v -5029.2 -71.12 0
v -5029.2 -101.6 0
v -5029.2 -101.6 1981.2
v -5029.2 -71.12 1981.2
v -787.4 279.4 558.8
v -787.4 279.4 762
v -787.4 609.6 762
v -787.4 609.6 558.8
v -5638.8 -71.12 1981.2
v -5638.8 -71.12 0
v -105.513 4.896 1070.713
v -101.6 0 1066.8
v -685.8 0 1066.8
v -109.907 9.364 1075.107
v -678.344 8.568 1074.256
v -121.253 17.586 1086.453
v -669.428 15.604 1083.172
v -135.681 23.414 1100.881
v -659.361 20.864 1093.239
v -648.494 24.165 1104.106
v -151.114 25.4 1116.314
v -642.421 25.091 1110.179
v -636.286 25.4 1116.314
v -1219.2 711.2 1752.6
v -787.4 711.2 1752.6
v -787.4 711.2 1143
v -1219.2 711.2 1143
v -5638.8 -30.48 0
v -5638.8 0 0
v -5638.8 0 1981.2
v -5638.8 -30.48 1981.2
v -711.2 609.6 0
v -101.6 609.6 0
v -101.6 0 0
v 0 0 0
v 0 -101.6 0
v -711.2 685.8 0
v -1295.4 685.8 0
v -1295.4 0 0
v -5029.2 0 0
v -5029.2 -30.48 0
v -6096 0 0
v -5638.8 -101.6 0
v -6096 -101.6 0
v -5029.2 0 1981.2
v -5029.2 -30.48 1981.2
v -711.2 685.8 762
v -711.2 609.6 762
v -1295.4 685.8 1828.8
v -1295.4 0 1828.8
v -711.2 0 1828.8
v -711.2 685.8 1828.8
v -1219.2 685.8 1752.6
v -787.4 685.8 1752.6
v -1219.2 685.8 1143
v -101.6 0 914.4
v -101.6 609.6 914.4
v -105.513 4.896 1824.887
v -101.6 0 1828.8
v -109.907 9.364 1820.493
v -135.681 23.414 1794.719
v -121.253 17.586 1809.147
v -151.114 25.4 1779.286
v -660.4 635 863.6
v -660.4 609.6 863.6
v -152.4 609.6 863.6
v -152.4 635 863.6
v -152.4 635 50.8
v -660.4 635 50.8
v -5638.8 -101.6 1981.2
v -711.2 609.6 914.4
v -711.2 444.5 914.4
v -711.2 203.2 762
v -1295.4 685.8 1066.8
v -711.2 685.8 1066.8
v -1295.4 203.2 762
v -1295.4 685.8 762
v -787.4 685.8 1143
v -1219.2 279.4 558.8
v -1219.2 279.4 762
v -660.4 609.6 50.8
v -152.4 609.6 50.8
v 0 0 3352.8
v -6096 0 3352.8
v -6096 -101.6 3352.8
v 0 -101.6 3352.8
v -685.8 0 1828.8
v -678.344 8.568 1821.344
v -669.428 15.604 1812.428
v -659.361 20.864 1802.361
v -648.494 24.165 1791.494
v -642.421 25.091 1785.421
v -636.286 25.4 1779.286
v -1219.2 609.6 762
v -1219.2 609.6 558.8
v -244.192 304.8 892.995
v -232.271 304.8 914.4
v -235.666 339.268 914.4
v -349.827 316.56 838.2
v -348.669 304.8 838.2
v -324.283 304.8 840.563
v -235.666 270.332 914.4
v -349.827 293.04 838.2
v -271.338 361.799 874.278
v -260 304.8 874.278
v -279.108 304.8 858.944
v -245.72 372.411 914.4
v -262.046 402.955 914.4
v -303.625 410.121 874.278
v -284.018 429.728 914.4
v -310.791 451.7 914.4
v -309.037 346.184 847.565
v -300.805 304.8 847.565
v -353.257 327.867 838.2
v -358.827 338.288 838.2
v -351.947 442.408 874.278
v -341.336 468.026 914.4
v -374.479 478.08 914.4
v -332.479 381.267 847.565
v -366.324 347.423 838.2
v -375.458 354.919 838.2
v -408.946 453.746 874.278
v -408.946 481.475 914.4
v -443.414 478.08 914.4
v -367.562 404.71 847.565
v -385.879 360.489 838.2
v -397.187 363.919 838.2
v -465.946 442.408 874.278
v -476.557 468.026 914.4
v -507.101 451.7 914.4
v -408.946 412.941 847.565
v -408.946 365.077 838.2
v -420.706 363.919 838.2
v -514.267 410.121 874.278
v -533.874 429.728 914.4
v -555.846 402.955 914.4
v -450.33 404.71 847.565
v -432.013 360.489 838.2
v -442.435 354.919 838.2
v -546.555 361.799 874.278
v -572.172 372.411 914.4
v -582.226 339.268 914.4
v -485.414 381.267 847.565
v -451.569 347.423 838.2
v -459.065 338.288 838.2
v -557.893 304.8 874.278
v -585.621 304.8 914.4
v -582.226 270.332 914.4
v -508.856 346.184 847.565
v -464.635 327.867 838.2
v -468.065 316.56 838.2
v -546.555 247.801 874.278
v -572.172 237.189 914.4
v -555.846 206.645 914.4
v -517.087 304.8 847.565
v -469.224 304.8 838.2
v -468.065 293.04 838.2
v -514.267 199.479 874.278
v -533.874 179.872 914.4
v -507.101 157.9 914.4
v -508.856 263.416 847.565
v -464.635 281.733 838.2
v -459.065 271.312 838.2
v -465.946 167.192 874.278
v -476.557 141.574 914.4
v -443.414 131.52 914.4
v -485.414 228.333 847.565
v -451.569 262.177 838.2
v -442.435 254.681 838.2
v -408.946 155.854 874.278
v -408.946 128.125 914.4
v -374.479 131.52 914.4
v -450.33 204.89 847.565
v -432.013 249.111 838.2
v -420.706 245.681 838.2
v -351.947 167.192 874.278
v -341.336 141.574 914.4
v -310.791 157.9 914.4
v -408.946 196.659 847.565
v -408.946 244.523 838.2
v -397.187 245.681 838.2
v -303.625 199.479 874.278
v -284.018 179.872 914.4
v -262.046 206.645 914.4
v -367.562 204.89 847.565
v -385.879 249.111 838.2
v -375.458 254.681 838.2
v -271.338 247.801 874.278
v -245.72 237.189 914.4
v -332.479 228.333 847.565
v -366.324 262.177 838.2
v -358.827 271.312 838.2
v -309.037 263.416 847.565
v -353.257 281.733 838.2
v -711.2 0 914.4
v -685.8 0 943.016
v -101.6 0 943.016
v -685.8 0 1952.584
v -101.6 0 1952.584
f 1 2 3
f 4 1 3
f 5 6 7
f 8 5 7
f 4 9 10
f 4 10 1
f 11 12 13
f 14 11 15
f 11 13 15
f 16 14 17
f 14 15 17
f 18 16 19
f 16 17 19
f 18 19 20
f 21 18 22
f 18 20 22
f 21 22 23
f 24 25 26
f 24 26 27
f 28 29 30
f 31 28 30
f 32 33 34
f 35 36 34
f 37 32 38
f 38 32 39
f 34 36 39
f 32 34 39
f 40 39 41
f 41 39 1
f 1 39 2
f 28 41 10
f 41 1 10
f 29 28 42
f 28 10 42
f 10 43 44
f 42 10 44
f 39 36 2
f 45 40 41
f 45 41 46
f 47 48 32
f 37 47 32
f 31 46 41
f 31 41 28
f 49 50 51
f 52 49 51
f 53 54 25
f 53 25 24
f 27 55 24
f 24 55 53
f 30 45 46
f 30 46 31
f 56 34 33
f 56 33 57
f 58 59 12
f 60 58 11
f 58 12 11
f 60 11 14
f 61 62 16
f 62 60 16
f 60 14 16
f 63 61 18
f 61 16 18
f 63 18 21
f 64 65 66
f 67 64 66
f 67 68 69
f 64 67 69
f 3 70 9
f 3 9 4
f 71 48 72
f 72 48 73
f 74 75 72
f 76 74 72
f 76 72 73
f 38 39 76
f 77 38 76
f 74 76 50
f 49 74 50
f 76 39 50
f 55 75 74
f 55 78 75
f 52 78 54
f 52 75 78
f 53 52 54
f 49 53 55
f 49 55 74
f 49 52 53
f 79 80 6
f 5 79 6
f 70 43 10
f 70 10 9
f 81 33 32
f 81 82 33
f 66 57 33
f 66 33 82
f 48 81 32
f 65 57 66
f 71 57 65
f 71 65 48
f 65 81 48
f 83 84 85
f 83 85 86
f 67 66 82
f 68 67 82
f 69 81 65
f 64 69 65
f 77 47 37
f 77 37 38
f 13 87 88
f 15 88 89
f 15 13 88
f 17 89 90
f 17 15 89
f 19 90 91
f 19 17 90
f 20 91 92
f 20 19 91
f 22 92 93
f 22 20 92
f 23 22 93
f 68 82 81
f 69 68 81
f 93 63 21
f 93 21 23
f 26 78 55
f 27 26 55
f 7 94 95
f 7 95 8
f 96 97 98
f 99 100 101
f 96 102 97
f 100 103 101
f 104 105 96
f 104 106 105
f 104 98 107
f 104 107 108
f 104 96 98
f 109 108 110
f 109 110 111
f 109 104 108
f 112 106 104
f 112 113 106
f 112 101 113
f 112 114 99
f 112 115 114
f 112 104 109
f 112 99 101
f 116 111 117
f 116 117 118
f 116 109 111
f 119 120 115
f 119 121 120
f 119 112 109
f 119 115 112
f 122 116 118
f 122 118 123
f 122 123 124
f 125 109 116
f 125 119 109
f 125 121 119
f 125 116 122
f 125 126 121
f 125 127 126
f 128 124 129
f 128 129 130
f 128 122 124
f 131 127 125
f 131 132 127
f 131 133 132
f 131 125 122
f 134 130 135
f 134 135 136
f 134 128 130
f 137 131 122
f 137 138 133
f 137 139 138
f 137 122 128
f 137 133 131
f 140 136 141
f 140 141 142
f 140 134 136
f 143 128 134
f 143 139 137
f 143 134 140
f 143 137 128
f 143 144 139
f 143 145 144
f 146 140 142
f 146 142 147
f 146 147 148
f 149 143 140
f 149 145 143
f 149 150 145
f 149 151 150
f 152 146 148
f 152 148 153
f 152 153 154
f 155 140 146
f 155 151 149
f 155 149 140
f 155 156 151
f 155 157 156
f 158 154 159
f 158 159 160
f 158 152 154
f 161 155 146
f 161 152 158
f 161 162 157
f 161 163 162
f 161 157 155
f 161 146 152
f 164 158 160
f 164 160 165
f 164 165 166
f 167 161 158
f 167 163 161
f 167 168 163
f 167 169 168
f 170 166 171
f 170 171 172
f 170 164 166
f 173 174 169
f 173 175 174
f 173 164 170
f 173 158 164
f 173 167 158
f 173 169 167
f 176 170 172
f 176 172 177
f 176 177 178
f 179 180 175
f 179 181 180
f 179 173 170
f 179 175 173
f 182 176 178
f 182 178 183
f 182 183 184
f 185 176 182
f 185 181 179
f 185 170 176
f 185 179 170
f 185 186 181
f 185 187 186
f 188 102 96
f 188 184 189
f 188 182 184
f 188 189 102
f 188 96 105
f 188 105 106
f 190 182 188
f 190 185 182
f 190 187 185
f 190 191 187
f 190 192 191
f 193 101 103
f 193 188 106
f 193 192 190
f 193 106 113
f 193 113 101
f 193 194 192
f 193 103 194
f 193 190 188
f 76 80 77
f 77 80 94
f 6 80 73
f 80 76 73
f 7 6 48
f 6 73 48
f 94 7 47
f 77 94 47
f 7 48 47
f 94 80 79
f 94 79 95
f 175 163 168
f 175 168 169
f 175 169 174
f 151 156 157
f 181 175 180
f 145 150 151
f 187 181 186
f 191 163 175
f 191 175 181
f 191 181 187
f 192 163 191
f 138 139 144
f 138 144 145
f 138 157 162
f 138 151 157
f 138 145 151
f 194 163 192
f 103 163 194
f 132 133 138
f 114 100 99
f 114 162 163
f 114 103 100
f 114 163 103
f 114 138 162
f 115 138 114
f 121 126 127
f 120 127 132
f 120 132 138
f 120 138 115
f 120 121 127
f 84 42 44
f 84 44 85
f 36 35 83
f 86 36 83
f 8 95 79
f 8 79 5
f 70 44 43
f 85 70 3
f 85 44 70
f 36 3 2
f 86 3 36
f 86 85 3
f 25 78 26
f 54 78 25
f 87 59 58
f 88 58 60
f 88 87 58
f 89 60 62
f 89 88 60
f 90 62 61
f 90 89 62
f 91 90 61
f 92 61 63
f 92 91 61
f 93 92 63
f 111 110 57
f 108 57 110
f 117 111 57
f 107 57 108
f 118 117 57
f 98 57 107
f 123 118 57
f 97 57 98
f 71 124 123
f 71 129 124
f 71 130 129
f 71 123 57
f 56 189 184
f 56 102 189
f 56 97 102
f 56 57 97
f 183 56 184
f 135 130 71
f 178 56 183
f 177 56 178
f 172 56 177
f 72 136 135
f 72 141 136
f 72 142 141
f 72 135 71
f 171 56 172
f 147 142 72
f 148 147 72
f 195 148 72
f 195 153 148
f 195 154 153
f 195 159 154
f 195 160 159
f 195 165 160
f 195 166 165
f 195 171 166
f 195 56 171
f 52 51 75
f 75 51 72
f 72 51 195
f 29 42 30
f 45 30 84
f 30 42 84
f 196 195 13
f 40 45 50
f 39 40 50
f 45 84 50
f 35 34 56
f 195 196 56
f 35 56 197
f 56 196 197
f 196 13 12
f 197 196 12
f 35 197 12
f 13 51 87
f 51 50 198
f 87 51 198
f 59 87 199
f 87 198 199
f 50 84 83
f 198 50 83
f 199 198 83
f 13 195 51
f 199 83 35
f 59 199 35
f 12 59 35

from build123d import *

# Parameters (mm, degrees)
F0_W         = 6096
F0_H         = 3352.8
F1_DEPTH     = 101.6
F2_W         = 609.6
F2_H         = 1981.2
F3_DEPTH     = 30.48
F4_W         = 609.6
F4_H         = 1981.2
F5_DEPTH     = 30.48
F7_DEPTH     = 685.8
F9_DEPTH     = 609.6
F6_W         = 609.6
F6_H         = 914.4
F10_DEPTH    = 609.6
F11_R        = 176.6748318238
F12_DEPTH    = 76.2
F14_W        = 431.8
F14_H        = 609.6
F15_DEPTH    = 25.4
F16_W        = 431.8
F16_H        = 330.2
F17_DEPTH    = 203.2
F19_DEPTH    = 25.4
F6_W_2       = 584.2
F6_H_2       = 762
F20_DEPTH    = 25.4
F21_T1_DEPTH = 1009.5685763581
F21_T3_DEPTH = 707.9842881791


# Not quite as in the source:
# - a fillet or chamfer that OpenCascade refuses, or shapes differently, is made with other operations: its cross-section is extruded or revolved along the edge and cut away or added


with BuildPart() as f1:
    # F0 (on Front) → F1 (new body)
    with BuildSketch(Plane.XZ):
        with Locations((-3048, 1676.4)):
            Rectangle(F0_W, F0_H)
    extrude(amount=F1_DEPTH)

    # F2 (on face) → F3 (cut)
    with BuildSketch(Plane.XZ.offset(101.6)):
        with Locations((-5334, 990.6)):
            Rectangle(F2_W, F2_H)
    extrude(amount=-F3_DEPTH, mode=Mode.SUBTRACT)

    # F4 (on face) → F5 (cut)
    with BuildSketch(Plane(origin=(0, 0, 0), x_dir=(-1, 0, 0), z_dir=(0, 1, 0))):
        with Locations((5334, 990.6)):
            Rectangle(F4_W, F4_H)
    extrude(amount=-F5_DEPTH, mode=Mode.SUBTRACT)

    # F6 (on face) → F7 (join)
    with BuildSketch(Plane(origin=(0, 0, 0), x_dir=(-1, 0, 0), z_dir=(0, 1, 0))):
        Polygon((711.2, 914.4), (711.2, 0), (1295.4, 0), (1295.4, 1828.8), (711.2, 1828.8), align=None)
    extrude(amount=F7_DEPTH)

    # F8 (on face) → F9 (cut)
    with BuildSketch(Plane.YZ.offset(-711.2)):
        Polygon((203.2, 762), (685.8, 762), (685.8, 1066.8), align=None)
    extrude(amount=-F9_DEPTH, mode=Mode.SUBTRACT)

    # F6 (on face) → F10 (join)
    with BuildSketch(Plane(origin=(0, 0, 0), x_dir=(-1, 0, 0), z_dir=(0, 1, 0))):
        with Locations((406.4, 457.2)):
            Rectangle(F6_W, F6_H)
    extrude(amount=F10_DEPTH)

    # F11 (on face) → F12 (cut)
    with BuildSketch(Plane.XY.offset(914.4)):
        with Locations((-408.9462161064, 304.8)):
            Circle(F11_R)
    extrude(amount=-F12_DEPTH, mode=Mode.SUBTRACT)

    # F13: fillet of radius 127 on 1 edges, made by hand

    # F13_s1 → F13_t2 (revolve)
    with BuildSketch(Plane.XZ.offset(-304.8)):
        with BuildLine():
            ThreePointArc((-232.2713842826, 914.4), (-279.1080421313, 858.9441766302), (-348.6688069344, 838.2))
            Line((-348.6688069344, 838.2), (-232.2713842826, 838.2))
            Line((-232.2713842826, 838.2), (-232.2713842826, 914.4))
        make_face()
    revolve(axis=Axis((-408.9462161064, 304.8, 838.2), (0, 0, 1)))

    # F14 (on face) → F15 (join)
    with BuildSketch(Plane(origin=(0, 685.8, 0), x_dir=(-1, 0, 0), z_dir=(0, 1, 0))):
        with Locations((1003.3, 1447.8)):
            Rectangle(F14_W, F14_H)
    extrude(amount=F15_DEPTH)

    # F16 (on face) → F17 (cut)
    with BuildSketch(Plane.XY.offset(762)):
        with Locations((-1003.3, 444.5)):
            Rectangle(F16_W, F16_H)
    extrude(amount=-F17_DEPTH, mode=Mode.SUBTRACT)

    # F18 (on face) → F19 (join)
    with BuildSketch(Plane(origin=(0, 609.6, 0), x_dir=(-1, 0, 0), z_dir=(0, 1, 0))):
        Polygon((152.4, 50.8), (660.4, 50.8), (660.4, 762), (660.4, 863.6), (152.4, 863.6), align=None)
    extrude(amount=F19_DEPTH)

    # F6 (on face) → F20 (join)
    with BuildSketch(Plane(origin=(0, 0, 0), x_dir=(-1, 0, 0), z_dir=(0, 1, 0))):
        with Locations((393.7, 1447.8)):
            Rectangle(F6_W_2, F6_H_2)
    extrude(amount=F20_DEPTH)

    # F21: fillet of radius 60.96 on 4 edges, made by hand

    # F21_s2 → F21_t1 (cut)
    with BuildSketch(Plane.XY.offset(943.0157118209)):
        with BuildLine():
            ThreePointArc((-101.6, 0), (-123.2894093504, 18.6795575203), (-151.1137152716, 25.4))
            Line((-151.1137152716, 25.4), (-101.6, 25.4))
            Line((-101.6, 25.4), (-101.6, 0))
        make_face()
        with BuildLine():
            ThreePointArc((-685.8, 0), (-664.1105906496, 18.6795575203), (-636.2862847284, 25.4))
            Line((-636.2862847284, 25.4), (-685.8, 25.4))
            Line((-685.8, 25.4), (-685.8, 0))
        make_face()
    extrude(amount=F21_T1_DEPTH, mode=Mode.SUBTRACT)

    # F21_s4 → F21_t3 (cut)
    with BuildSketch(Plane.YZ.offset(-685.8)):
        with BuildLine():
            ThreePointArc((0, 1066.8), (18.6795575203, 1088.4894093504), (25.4, 1116.3137152716))
            Line((25.4, 1116.3137152716), (25.4, 1066.8))
            Line((25.4, 1066.8), (0, 1066.8))
        make_face()
        with BuildLine():
            ThreePointArc((0, 1828.8), (18.6795575203, 1807.1105906496), (25.4, 1779.2862847284))
            Line((25.4, 1779.2862847284), (25.4, 1828.8))
            Line((25.4, 1828.8), (0, 1828.8))
        make_face()
    extrude(amount=F21_T3_DEPTH, mode=Mode.SUBTRACT)


solid = f1.part
